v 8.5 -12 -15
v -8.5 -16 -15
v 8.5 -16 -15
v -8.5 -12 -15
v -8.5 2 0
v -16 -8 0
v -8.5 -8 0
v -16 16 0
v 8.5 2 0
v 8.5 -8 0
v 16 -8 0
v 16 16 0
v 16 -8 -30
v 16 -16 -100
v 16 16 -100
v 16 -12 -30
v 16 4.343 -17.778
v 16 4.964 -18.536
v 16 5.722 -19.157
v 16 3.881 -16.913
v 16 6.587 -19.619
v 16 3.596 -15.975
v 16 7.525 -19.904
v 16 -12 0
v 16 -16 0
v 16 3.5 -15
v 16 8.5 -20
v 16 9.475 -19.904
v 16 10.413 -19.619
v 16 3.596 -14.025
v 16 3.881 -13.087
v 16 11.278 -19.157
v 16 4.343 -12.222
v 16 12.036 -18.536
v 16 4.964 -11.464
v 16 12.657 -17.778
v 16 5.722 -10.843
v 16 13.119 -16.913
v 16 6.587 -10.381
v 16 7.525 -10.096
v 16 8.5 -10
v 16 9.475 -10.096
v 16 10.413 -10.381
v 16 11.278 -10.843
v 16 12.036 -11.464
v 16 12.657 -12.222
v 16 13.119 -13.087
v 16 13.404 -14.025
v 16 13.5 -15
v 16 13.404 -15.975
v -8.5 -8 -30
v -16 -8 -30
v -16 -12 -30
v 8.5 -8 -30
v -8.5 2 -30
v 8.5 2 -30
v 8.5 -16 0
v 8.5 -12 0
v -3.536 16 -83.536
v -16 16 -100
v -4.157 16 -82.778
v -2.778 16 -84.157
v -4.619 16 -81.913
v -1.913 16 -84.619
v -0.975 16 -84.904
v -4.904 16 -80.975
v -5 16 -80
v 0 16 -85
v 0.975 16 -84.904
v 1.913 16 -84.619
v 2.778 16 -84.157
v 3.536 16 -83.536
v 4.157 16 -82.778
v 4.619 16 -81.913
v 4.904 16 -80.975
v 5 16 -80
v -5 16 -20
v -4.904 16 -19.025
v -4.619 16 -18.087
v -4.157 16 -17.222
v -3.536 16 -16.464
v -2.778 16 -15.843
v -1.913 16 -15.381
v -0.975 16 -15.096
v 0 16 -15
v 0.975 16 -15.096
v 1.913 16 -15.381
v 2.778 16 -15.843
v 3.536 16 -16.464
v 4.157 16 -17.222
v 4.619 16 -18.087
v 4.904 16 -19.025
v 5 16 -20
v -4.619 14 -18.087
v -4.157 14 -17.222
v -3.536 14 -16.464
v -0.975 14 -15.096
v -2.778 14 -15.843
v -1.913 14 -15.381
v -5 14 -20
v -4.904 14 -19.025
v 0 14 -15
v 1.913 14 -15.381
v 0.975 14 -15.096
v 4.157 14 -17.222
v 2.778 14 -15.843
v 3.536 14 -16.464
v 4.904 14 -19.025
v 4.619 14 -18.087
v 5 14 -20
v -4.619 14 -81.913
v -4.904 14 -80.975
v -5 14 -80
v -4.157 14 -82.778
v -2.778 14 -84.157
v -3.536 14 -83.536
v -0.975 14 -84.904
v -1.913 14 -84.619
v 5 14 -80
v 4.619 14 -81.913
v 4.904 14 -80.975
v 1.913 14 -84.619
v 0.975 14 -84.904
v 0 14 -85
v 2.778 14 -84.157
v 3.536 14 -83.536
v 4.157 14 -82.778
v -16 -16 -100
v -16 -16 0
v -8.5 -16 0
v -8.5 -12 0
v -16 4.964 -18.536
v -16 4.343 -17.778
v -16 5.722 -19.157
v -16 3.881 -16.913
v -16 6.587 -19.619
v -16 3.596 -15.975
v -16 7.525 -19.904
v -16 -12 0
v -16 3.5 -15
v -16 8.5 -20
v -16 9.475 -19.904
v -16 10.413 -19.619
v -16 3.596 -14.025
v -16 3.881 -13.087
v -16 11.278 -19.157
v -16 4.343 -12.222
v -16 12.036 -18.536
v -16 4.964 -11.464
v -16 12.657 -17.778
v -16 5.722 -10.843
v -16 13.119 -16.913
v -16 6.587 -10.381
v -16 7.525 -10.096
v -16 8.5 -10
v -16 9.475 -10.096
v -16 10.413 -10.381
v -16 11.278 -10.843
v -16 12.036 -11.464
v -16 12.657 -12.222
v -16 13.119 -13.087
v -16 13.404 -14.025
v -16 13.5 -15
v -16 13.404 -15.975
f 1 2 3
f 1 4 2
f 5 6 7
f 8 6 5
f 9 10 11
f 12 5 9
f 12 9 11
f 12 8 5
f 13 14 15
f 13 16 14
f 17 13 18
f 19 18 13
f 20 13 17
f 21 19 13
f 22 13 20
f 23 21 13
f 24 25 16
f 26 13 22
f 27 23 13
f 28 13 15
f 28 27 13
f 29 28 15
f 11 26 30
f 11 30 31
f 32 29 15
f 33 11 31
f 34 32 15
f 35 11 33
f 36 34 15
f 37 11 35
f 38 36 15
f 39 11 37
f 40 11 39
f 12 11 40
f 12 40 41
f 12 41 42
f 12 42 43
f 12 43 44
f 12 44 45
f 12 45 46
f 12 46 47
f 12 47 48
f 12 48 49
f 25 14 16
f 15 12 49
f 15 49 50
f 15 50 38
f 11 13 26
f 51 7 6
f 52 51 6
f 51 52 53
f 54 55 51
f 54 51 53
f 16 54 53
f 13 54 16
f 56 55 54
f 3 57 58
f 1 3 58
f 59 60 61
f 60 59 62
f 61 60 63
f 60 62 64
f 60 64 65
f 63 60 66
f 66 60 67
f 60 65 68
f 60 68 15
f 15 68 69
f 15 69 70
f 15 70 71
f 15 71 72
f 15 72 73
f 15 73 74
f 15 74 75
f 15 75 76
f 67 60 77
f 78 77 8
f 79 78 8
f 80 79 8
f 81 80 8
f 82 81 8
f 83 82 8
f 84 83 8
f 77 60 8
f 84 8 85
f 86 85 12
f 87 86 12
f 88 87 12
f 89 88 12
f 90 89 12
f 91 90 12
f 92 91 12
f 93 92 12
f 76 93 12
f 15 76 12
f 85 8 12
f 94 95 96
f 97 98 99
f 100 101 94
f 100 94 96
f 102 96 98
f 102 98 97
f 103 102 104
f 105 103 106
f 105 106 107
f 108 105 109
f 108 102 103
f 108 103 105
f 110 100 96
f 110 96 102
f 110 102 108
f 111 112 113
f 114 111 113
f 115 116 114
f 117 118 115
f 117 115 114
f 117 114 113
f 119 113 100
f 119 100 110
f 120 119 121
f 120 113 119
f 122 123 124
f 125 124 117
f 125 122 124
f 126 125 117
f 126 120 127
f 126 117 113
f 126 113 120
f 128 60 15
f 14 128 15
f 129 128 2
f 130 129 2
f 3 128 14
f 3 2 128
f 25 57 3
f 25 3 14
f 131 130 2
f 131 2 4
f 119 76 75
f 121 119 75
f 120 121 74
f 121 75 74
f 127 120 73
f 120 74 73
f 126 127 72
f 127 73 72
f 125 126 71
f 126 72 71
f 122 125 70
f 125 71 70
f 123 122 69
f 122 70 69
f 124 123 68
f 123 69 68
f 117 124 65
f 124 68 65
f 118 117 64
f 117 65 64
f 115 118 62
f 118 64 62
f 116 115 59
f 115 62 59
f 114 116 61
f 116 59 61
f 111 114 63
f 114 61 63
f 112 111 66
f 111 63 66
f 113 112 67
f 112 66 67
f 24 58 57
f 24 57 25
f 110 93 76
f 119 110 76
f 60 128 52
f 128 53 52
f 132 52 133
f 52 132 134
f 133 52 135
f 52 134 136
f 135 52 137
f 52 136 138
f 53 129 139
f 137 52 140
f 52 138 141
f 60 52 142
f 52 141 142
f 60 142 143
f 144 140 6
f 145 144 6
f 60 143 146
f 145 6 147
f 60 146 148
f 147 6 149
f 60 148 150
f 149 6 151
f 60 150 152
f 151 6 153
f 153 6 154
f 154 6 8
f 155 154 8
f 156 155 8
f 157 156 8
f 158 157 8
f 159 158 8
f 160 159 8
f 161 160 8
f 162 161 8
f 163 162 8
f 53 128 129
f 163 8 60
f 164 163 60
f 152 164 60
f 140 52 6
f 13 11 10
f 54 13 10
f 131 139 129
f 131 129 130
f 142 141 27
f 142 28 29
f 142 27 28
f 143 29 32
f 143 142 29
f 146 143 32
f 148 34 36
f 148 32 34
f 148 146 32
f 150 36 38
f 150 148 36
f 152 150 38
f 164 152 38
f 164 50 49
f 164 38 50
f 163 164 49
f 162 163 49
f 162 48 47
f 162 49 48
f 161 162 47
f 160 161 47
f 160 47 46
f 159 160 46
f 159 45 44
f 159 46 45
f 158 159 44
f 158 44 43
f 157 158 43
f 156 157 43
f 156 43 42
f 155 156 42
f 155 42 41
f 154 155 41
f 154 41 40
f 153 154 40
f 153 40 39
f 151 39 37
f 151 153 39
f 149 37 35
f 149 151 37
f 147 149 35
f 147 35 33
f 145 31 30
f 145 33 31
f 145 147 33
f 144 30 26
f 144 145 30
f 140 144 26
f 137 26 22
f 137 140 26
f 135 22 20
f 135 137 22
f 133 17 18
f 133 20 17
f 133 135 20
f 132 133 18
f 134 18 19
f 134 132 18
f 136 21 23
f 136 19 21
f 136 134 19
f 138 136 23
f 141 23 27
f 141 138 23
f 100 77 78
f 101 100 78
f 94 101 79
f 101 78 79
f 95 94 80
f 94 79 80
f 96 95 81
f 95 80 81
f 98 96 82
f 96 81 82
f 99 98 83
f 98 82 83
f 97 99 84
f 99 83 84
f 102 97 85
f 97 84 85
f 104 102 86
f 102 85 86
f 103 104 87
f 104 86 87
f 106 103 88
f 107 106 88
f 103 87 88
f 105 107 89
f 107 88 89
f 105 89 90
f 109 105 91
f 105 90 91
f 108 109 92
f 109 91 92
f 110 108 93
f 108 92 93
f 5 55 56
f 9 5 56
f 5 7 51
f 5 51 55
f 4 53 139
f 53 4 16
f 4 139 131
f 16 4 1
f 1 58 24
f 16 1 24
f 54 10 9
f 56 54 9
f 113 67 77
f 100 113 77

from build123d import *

# Parameters (mm, degrees)
SKETCH1_W               = 32
SKETCH1_H               = 32
BOSS_EXTRUDE1_DEPTH     = 100
CUT_EXTRUDE1_START      = 16
SKETCH2_R               = 5
CUT_EXTRUDE1_DEPTH      = 2
SKETCH3_W               = 17
SKETCH3_H               = 10
CUT_EXTRUDE2_DEPTH      = 30
SKETCH3_4_W             = 8.5
SKETCH3_4_H             = 10.001446171
CUT_EXTRUDE4_DEPTH      = 15
CUT_EXTRUDE3_DEPTH      = 103.528044944
CUT_EXTRUDE3_DEPTH_BACK = 103.528044944
SKETCH4_R               = 5


with BuildPart() as part:
    # Sketch1 → Boss-Extrude1 (new body)
    with BuildSketch(Plane.XY):
        Rectangle(SKETCH1_W, SKETCH1_H)
    extrude(amount=-BOSS_EXTRUDE1_DEPTH)

    # Sketch2 → Cut-Extrude1 (cut)
    with BuildSketch(Plane(origin=(0, 0, 0), x_dir=(1, 0, 0), z_dir=(0, 1, 0)).offset(CUT_EXTRUDE1_START)):
        with BuildLine():
            Line((5, 20), (5, 80))
            ThreePointArc((5, 80), (0, 75), (-5, 80))
            Line((-5, 80), (-5, 20))
            ThreePointArc((-5, 20), (0, 25), (5, 20))
        make_face()
        with Locations((0, 80)):
            Circle(SKETCH2_R)
        with Locations((0, 20)):
            Circle(SKETCH2_R)
    extrude(amount=-CUT_EXTRUDE1_DEPTH, mode=Mode.SUBTRACT)

    # Sketch3 → Cut-Extrude2 (cut)
    with BuildSketch(Plane.XY):
        with Locations((0, -3)):
            Rectangle(SKETCH3_W, SKETCH3_H)
        Polygon((-8.5, -8), (-16, -8), (-16, -12), (-8.5, -12), (8.5, -12), (16, -12), (16, -8), (8.5, -8), align=None)
    extrude(amount=-CUT_EXTRUDE2_DEPTH, mode=Mode.SUBTRACT)

    # Sketch3<4> → Cut-Extrude4 (cut)
    with BuildSketch(Plane.XY):
        with Locations((4.25, -17.000723085)):
            Rectangle(SKETCH3_4_W, SKETCH3_4_H)
        with Locations((-4.25, -17.000723085)):
            Rectangle(SKETCH3_4_W, SKETCH3_4_H)
    extrude(amount=-CUT_EXTRUDE4_DEPTH, mode=Mode.SUBTRACT)

    # Sketch4 → Cut-Extrude3 (cut, two sides: drawn at the far end of the back side and taken through both)
    with BuildSketch(Plane(origin=(0, 0, 0), x_dir=(0, 0, -1), z_dir=(1, 0, 0)).offset(-CUT_EXTRUDE3_DEPTH_BACK)):
        with Locations((15, 8.5)):
            Circle(SKETCH4_R)
    extrude(amount=CUT_EXTRUDE3_DEPTH + CUT_EXTRUDE3_DEPTH_BACK, mode=Mode.SUBTRACT)


solid = part.part
